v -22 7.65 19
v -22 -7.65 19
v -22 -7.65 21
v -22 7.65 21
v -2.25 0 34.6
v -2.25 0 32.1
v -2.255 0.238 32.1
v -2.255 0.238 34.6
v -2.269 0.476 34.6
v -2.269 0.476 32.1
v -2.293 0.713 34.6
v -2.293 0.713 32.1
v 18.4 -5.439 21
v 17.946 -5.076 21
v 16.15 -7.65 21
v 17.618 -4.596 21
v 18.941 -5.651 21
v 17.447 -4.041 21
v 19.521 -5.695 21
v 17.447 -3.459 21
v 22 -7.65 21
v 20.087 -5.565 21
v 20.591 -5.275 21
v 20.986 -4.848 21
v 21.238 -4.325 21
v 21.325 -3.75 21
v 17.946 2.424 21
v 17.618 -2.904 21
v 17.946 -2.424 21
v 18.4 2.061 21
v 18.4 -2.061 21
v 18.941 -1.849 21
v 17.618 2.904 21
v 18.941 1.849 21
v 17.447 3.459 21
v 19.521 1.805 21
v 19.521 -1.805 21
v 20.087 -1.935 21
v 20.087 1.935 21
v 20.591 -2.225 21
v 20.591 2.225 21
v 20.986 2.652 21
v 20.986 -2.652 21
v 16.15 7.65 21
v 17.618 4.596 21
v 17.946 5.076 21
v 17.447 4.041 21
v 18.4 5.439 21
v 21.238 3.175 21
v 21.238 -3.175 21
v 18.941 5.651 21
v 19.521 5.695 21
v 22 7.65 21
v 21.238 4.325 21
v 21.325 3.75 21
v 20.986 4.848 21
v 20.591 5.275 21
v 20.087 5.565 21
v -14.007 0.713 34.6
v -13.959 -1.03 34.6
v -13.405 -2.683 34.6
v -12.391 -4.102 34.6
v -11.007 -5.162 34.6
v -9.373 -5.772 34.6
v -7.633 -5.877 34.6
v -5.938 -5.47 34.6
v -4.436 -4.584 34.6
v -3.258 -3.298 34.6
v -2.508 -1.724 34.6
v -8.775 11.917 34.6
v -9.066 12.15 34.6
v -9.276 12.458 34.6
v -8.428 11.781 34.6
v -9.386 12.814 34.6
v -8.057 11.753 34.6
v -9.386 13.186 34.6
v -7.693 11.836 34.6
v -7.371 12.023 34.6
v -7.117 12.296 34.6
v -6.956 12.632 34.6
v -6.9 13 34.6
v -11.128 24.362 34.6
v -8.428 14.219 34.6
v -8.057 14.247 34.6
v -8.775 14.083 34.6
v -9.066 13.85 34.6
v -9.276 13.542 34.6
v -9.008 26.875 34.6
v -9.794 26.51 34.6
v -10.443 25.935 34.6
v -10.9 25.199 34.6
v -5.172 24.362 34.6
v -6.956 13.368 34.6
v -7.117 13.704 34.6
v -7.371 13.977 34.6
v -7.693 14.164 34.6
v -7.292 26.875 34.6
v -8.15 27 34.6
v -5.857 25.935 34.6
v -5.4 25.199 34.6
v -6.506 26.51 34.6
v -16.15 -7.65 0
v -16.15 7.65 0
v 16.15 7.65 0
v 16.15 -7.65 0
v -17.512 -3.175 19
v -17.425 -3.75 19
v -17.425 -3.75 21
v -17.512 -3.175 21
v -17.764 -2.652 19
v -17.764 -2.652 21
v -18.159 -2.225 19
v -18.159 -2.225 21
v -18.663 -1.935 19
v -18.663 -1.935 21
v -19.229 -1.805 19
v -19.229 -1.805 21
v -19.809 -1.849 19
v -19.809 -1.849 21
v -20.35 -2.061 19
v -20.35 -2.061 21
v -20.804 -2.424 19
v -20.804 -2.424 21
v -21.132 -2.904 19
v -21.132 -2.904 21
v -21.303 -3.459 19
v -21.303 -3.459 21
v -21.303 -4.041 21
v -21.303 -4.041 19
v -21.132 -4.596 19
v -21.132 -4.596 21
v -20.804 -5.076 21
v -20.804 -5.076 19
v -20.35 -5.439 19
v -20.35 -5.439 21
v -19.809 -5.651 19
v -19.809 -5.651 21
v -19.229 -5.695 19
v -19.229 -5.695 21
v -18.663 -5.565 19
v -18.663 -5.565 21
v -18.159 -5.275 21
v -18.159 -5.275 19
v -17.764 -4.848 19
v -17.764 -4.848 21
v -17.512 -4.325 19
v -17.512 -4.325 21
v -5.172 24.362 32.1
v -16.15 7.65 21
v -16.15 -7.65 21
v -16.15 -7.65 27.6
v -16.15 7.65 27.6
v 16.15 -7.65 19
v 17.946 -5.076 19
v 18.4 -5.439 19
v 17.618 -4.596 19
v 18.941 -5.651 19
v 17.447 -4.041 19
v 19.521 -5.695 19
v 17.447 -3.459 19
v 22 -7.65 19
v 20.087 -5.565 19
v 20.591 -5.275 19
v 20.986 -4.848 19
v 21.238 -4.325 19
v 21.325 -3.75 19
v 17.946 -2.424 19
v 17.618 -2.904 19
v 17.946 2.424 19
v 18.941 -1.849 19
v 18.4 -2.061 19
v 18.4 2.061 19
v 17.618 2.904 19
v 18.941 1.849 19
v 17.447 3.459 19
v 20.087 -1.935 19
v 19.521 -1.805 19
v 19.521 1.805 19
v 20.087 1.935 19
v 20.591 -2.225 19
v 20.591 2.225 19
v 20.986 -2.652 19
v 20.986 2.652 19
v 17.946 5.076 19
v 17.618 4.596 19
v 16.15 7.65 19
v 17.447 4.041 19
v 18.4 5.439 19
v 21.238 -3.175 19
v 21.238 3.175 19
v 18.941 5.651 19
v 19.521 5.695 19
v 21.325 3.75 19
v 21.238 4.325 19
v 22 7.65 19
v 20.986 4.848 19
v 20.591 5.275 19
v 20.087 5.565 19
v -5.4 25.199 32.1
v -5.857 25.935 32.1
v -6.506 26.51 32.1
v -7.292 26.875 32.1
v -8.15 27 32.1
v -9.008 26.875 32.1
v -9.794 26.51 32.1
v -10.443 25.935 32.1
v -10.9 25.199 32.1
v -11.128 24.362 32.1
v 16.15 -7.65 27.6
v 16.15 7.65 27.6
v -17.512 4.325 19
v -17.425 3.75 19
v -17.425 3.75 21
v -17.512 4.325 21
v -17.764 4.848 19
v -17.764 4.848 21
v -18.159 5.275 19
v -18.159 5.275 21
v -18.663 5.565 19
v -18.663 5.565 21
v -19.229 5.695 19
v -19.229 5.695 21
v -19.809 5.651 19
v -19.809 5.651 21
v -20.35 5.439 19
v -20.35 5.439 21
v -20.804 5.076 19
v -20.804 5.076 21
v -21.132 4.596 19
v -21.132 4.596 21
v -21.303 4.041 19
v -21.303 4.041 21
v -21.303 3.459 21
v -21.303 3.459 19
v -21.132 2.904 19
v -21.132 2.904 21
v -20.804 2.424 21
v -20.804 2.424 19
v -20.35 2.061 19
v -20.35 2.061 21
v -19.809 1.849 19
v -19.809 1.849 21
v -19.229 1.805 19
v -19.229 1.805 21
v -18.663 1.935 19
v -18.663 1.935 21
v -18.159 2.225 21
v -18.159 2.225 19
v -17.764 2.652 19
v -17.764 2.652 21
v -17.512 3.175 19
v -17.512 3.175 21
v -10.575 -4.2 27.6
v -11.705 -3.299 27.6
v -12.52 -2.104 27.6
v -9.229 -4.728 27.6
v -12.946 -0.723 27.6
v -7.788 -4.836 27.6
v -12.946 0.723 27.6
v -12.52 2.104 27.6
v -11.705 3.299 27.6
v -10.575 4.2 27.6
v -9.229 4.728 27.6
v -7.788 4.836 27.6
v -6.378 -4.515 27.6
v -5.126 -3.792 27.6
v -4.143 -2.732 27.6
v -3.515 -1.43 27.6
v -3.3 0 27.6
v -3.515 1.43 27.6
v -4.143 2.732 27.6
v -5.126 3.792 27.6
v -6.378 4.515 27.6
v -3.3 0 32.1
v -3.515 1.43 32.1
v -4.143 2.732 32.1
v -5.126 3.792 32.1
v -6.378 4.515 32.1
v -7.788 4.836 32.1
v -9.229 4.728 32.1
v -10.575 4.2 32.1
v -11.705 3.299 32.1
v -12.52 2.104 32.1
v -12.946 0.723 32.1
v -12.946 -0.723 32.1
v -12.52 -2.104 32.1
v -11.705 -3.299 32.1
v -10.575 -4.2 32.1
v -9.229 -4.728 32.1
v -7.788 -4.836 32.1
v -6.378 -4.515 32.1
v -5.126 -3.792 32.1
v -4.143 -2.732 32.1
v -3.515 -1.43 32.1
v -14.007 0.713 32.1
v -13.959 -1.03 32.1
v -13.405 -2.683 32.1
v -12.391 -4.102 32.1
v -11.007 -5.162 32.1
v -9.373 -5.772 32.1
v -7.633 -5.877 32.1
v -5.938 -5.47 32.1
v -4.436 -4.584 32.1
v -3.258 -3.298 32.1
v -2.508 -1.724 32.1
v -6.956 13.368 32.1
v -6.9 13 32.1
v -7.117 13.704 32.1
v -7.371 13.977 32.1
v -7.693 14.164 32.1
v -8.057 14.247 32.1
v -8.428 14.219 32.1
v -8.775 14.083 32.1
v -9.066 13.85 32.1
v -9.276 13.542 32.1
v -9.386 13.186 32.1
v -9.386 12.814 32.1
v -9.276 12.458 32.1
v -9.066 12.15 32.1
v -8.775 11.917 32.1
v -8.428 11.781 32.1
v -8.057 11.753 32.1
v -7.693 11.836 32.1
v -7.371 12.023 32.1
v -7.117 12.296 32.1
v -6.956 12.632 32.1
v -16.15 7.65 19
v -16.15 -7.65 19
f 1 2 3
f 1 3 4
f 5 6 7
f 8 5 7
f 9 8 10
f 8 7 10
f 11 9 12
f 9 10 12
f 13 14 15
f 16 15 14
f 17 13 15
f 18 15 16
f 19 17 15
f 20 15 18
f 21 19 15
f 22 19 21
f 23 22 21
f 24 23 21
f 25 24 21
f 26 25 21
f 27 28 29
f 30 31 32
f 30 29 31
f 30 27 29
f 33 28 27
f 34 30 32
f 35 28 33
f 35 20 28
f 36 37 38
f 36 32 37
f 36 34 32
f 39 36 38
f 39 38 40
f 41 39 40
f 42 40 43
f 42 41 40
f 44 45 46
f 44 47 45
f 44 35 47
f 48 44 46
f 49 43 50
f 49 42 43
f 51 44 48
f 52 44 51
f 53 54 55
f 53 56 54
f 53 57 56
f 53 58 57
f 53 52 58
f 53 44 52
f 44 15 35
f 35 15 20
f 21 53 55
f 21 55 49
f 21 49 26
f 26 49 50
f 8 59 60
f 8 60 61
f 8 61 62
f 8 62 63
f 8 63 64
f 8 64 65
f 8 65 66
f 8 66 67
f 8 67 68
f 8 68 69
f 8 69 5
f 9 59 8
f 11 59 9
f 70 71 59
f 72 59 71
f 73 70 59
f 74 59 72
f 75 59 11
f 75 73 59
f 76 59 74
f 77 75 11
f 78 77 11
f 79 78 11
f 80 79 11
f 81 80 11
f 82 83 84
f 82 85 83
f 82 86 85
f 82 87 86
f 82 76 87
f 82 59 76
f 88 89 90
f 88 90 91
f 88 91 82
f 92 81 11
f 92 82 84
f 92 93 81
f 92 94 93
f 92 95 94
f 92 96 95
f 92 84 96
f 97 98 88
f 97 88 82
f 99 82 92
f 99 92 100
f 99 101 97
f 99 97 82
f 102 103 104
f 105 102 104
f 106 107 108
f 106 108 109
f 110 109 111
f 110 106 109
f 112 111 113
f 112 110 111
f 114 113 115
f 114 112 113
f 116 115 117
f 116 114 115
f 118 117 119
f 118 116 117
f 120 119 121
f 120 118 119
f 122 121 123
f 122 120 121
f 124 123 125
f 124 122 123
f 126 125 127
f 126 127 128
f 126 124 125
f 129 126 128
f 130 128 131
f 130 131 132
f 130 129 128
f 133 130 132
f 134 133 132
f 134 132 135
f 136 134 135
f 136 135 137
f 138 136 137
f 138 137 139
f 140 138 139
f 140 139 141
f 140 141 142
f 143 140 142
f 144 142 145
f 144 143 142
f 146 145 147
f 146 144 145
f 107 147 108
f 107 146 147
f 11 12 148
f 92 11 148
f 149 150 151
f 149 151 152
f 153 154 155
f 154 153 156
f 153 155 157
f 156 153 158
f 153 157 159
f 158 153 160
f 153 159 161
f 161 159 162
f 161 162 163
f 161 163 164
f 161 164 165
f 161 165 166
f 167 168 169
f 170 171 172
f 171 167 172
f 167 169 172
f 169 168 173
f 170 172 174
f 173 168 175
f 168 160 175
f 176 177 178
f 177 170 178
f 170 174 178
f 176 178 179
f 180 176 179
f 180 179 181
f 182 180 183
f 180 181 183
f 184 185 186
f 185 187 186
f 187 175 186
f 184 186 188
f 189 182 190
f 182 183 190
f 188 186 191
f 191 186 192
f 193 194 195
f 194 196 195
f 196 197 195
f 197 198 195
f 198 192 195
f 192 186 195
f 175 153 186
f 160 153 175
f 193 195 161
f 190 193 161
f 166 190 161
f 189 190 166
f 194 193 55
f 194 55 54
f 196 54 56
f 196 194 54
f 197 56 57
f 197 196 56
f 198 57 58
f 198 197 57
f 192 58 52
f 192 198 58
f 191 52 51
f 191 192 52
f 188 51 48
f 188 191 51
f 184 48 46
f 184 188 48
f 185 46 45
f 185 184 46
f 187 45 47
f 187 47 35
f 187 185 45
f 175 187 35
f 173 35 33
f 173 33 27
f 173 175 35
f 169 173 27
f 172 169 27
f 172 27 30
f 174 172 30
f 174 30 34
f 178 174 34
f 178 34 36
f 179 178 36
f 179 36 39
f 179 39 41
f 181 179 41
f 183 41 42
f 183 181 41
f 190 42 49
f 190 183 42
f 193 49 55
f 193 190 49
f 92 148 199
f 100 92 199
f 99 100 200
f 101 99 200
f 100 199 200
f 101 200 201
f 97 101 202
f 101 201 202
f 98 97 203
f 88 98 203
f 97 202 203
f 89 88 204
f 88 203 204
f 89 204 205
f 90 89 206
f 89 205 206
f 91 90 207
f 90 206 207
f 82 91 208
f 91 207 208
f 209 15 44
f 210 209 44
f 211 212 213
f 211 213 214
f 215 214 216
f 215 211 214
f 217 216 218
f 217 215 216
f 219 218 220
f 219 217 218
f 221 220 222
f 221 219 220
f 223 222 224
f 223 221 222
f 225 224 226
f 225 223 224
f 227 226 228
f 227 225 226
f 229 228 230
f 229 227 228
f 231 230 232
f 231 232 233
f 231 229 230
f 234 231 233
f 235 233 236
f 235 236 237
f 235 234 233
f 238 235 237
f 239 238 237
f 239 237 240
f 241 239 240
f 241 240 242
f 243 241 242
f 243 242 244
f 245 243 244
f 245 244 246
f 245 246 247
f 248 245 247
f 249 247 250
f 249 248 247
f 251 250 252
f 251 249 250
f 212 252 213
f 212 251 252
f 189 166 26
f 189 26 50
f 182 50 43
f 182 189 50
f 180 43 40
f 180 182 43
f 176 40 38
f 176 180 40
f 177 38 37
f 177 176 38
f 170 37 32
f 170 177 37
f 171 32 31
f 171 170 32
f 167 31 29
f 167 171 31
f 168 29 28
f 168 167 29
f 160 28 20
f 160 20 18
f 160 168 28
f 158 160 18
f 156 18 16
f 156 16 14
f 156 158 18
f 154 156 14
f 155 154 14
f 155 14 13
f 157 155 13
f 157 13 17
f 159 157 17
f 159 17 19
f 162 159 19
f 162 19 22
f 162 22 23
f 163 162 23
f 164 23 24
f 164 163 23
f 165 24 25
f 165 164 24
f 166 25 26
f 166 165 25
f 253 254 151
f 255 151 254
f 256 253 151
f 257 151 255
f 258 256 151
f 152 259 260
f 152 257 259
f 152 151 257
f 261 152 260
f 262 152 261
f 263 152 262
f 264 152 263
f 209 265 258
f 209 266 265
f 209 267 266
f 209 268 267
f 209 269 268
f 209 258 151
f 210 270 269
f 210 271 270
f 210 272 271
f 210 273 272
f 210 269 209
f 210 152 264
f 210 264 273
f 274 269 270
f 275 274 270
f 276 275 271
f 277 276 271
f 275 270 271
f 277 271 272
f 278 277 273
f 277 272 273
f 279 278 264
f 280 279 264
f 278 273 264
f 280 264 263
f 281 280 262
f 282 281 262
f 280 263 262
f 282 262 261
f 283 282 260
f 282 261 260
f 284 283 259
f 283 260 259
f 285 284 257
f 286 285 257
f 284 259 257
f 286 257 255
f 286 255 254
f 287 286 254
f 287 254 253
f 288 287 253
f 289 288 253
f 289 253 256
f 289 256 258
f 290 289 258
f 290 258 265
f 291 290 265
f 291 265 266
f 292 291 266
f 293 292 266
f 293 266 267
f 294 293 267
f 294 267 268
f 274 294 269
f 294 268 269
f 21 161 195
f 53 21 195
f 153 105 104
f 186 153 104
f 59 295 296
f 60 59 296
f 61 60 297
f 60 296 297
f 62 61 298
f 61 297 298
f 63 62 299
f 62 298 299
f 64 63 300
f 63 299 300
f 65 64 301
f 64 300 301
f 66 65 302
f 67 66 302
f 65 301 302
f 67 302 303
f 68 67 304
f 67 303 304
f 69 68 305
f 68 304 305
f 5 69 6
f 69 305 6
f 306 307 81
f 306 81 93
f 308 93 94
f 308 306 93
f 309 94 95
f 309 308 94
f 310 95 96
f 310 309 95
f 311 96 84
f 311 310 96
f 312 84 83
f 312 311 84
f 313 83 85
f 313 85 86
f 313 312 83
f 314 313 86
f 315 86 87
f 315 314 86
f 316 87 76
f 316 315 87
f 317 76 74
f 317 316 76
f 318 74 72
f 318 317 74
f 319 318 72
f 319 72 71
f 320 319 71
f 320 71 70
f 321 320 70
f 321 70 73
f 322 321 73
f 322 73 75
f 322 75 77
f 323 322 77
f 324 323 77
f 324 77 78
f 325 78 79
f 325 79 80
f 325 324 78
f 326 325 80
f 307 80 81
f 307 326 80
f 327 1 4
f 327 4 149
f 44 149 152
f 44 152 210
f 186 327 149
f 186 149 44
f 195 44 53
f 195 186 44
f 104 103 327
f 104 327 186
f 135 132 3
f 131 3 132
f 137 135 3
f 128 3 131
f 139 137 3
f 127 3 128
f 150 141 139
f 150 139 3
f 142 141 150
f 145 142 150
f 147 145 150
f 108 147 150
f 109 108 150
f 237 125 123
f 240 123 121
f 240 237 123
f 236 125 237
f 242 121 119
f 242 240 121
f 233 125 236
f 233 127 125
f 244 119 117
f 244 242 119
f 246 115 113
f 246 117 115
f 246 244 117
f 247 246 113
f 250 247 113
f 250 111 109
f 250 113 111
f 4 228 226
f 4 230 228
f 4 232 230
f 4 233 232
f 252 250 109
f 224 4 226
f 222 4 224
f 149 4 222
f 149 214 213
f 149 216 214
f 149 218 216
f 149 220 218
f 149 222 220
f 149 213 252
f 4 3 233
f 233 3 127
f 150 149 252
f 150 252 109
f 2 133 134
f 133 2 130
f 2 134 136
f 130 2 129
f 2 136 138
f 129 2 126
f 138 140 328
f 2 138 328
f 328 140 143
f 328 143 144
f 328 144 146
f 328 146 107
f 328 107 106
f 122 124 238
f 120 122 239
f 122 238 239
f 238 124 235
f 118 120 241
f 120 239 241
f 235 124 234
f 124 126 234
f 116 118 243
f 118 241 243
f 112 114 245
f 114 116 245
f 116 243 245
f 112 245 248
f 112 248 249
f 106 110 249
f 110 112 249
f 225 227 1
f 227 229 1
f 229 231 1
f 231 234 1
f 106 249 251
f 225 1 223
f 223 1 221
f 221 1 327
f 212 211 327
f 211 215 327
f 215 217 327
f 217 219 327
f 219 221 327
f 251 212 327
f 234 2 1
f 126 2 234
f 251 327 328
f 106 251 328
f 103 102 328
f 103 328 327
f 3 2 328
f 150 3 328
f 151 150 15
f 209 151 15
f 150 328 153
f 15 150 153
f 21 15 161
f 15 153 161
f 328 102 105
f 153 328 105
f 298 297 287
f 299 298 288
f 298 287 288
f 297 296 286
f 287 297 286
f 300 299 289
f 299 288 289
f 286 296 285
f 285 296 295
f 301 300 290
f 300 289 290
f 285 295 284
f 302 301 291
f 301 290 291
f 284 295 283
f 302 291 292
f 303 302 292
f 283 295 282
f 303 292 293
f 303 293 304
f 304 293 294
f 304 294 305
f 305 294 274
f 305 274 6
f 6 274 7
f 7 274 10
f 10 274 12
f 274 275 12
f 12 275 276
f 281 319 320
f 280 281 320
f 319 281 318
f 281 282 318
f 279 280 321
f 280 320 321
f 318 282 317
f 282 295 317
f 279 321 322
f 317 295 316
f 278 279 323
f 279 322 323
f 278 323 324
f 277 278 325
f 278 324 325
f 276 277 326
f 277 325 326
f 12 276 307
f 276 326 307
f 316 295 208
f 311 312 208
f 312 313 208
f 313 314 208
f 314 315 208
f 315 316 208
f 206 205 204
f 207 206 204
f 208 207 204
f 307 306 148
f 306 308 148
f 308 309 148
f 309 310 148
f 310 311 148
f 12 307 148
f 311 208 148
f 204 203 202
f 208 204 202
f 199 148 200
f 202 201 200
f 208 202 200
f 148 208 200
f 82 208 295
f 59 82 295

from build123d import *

# Parameters (mm, degrees)
F0_W     = 32.3
F0_H     = 15.3
F1_DEPTH = 27.6
F3_W     = 44
F3_H     = 15.3
F3_R     = 1.95
F4_DEPTH = 2
F5_R     = 4.85
F6_DEPTH = 4.5
F7_R     = 1.25
F8_DEPTH = 2.5


with BuildPart() as f1:
    # F0 (on Top) → F1 (new body)
    with BuildSketch(Plane.XY):
        Rectangle(F0_W, F0_H)
    extrude(amount=F1_DEPTH)

    # F3 (on offset) → F4 (join)
    with BuildSketch(Plane.XY.offset(19)):
        Rectangle(F3_W, F3_H)
        with Locations((-19.375, -3.75)):
            Circle(F3_R, mode=Mode.SUBTRACT)
        with Locations((19.375, -3.75)):
            Circle(F3_R, mode=Mode.SUBTRACT)
        with Locations((-19.375, 3.75)):
            Circle(F3_R, mode=Mode.SUBTRACT)
        with Locations((19.375, 3.75)):
            Circle(F3_R, mode=Mode.SUBTRACT)
    extrude(amount=F4_DEPTH)

    # F5 (on face) → F6 (join)
    with BuildSketch(Plane.XY.offset(27.6)):
        with Locations((-8.15, 0)):
            Circle(F5_R)
    extrude(amount=F6_DEPTH)

    # F7 (on face) → F8 (join)
    with BuildSketch(Plane.XY.offset(32.1)):
        with BuildLine():
            ThreePointArc((-14.00677, 0.712917), (-8.507113, -5.889182), (-2.25, 0))
            ThreePointArc((-2.25, 0), (-2.260818, 0.357113), (-2.29323, 0.712917))
            ThreePointArc((-2.29323, 0.712917), (-8.15, 5.9), (-14.00677, 0.712917))
        make_face()
        with BuildLine():
            ThreePointArc((-14.00677, 0.712917), (-8.15, 5.9), (-2.29323, 0.712917))
            Line((-2.29323, 0.712917), (-5.171982, 24.3625))
            ThreePointArc((-5.171982, 24.3625), (-5.1555, 24.181583), (-5.15, 24))
            ThreePointArc((-5.15, 24), (-8.331583, 21.0055), (-11.128018, 24.3625))
            Line((-11.128018, 24.3625), (-14.00677, 0.712917))
        make_face()
        with Locations((-8.15, 13)):
            Circle(F7_R, mode=Mode.SUBTRACT)
        with BuildLine():
            ThreePointArc((-5.15, 24), (-5.1555, 24.181583), (-5.171982, 24.3625))
            ThreePointArc((-5.171982, 24.3625), (-8.15, 27), (-11.128018, 24.3625))
            ThreePointArc((-11.128018, 24.3625), (-8.331583, 21.0055), (-5.15, 24))
        make_face()
    extrude(amount=F8_DEPTH)


solid = f1.part
